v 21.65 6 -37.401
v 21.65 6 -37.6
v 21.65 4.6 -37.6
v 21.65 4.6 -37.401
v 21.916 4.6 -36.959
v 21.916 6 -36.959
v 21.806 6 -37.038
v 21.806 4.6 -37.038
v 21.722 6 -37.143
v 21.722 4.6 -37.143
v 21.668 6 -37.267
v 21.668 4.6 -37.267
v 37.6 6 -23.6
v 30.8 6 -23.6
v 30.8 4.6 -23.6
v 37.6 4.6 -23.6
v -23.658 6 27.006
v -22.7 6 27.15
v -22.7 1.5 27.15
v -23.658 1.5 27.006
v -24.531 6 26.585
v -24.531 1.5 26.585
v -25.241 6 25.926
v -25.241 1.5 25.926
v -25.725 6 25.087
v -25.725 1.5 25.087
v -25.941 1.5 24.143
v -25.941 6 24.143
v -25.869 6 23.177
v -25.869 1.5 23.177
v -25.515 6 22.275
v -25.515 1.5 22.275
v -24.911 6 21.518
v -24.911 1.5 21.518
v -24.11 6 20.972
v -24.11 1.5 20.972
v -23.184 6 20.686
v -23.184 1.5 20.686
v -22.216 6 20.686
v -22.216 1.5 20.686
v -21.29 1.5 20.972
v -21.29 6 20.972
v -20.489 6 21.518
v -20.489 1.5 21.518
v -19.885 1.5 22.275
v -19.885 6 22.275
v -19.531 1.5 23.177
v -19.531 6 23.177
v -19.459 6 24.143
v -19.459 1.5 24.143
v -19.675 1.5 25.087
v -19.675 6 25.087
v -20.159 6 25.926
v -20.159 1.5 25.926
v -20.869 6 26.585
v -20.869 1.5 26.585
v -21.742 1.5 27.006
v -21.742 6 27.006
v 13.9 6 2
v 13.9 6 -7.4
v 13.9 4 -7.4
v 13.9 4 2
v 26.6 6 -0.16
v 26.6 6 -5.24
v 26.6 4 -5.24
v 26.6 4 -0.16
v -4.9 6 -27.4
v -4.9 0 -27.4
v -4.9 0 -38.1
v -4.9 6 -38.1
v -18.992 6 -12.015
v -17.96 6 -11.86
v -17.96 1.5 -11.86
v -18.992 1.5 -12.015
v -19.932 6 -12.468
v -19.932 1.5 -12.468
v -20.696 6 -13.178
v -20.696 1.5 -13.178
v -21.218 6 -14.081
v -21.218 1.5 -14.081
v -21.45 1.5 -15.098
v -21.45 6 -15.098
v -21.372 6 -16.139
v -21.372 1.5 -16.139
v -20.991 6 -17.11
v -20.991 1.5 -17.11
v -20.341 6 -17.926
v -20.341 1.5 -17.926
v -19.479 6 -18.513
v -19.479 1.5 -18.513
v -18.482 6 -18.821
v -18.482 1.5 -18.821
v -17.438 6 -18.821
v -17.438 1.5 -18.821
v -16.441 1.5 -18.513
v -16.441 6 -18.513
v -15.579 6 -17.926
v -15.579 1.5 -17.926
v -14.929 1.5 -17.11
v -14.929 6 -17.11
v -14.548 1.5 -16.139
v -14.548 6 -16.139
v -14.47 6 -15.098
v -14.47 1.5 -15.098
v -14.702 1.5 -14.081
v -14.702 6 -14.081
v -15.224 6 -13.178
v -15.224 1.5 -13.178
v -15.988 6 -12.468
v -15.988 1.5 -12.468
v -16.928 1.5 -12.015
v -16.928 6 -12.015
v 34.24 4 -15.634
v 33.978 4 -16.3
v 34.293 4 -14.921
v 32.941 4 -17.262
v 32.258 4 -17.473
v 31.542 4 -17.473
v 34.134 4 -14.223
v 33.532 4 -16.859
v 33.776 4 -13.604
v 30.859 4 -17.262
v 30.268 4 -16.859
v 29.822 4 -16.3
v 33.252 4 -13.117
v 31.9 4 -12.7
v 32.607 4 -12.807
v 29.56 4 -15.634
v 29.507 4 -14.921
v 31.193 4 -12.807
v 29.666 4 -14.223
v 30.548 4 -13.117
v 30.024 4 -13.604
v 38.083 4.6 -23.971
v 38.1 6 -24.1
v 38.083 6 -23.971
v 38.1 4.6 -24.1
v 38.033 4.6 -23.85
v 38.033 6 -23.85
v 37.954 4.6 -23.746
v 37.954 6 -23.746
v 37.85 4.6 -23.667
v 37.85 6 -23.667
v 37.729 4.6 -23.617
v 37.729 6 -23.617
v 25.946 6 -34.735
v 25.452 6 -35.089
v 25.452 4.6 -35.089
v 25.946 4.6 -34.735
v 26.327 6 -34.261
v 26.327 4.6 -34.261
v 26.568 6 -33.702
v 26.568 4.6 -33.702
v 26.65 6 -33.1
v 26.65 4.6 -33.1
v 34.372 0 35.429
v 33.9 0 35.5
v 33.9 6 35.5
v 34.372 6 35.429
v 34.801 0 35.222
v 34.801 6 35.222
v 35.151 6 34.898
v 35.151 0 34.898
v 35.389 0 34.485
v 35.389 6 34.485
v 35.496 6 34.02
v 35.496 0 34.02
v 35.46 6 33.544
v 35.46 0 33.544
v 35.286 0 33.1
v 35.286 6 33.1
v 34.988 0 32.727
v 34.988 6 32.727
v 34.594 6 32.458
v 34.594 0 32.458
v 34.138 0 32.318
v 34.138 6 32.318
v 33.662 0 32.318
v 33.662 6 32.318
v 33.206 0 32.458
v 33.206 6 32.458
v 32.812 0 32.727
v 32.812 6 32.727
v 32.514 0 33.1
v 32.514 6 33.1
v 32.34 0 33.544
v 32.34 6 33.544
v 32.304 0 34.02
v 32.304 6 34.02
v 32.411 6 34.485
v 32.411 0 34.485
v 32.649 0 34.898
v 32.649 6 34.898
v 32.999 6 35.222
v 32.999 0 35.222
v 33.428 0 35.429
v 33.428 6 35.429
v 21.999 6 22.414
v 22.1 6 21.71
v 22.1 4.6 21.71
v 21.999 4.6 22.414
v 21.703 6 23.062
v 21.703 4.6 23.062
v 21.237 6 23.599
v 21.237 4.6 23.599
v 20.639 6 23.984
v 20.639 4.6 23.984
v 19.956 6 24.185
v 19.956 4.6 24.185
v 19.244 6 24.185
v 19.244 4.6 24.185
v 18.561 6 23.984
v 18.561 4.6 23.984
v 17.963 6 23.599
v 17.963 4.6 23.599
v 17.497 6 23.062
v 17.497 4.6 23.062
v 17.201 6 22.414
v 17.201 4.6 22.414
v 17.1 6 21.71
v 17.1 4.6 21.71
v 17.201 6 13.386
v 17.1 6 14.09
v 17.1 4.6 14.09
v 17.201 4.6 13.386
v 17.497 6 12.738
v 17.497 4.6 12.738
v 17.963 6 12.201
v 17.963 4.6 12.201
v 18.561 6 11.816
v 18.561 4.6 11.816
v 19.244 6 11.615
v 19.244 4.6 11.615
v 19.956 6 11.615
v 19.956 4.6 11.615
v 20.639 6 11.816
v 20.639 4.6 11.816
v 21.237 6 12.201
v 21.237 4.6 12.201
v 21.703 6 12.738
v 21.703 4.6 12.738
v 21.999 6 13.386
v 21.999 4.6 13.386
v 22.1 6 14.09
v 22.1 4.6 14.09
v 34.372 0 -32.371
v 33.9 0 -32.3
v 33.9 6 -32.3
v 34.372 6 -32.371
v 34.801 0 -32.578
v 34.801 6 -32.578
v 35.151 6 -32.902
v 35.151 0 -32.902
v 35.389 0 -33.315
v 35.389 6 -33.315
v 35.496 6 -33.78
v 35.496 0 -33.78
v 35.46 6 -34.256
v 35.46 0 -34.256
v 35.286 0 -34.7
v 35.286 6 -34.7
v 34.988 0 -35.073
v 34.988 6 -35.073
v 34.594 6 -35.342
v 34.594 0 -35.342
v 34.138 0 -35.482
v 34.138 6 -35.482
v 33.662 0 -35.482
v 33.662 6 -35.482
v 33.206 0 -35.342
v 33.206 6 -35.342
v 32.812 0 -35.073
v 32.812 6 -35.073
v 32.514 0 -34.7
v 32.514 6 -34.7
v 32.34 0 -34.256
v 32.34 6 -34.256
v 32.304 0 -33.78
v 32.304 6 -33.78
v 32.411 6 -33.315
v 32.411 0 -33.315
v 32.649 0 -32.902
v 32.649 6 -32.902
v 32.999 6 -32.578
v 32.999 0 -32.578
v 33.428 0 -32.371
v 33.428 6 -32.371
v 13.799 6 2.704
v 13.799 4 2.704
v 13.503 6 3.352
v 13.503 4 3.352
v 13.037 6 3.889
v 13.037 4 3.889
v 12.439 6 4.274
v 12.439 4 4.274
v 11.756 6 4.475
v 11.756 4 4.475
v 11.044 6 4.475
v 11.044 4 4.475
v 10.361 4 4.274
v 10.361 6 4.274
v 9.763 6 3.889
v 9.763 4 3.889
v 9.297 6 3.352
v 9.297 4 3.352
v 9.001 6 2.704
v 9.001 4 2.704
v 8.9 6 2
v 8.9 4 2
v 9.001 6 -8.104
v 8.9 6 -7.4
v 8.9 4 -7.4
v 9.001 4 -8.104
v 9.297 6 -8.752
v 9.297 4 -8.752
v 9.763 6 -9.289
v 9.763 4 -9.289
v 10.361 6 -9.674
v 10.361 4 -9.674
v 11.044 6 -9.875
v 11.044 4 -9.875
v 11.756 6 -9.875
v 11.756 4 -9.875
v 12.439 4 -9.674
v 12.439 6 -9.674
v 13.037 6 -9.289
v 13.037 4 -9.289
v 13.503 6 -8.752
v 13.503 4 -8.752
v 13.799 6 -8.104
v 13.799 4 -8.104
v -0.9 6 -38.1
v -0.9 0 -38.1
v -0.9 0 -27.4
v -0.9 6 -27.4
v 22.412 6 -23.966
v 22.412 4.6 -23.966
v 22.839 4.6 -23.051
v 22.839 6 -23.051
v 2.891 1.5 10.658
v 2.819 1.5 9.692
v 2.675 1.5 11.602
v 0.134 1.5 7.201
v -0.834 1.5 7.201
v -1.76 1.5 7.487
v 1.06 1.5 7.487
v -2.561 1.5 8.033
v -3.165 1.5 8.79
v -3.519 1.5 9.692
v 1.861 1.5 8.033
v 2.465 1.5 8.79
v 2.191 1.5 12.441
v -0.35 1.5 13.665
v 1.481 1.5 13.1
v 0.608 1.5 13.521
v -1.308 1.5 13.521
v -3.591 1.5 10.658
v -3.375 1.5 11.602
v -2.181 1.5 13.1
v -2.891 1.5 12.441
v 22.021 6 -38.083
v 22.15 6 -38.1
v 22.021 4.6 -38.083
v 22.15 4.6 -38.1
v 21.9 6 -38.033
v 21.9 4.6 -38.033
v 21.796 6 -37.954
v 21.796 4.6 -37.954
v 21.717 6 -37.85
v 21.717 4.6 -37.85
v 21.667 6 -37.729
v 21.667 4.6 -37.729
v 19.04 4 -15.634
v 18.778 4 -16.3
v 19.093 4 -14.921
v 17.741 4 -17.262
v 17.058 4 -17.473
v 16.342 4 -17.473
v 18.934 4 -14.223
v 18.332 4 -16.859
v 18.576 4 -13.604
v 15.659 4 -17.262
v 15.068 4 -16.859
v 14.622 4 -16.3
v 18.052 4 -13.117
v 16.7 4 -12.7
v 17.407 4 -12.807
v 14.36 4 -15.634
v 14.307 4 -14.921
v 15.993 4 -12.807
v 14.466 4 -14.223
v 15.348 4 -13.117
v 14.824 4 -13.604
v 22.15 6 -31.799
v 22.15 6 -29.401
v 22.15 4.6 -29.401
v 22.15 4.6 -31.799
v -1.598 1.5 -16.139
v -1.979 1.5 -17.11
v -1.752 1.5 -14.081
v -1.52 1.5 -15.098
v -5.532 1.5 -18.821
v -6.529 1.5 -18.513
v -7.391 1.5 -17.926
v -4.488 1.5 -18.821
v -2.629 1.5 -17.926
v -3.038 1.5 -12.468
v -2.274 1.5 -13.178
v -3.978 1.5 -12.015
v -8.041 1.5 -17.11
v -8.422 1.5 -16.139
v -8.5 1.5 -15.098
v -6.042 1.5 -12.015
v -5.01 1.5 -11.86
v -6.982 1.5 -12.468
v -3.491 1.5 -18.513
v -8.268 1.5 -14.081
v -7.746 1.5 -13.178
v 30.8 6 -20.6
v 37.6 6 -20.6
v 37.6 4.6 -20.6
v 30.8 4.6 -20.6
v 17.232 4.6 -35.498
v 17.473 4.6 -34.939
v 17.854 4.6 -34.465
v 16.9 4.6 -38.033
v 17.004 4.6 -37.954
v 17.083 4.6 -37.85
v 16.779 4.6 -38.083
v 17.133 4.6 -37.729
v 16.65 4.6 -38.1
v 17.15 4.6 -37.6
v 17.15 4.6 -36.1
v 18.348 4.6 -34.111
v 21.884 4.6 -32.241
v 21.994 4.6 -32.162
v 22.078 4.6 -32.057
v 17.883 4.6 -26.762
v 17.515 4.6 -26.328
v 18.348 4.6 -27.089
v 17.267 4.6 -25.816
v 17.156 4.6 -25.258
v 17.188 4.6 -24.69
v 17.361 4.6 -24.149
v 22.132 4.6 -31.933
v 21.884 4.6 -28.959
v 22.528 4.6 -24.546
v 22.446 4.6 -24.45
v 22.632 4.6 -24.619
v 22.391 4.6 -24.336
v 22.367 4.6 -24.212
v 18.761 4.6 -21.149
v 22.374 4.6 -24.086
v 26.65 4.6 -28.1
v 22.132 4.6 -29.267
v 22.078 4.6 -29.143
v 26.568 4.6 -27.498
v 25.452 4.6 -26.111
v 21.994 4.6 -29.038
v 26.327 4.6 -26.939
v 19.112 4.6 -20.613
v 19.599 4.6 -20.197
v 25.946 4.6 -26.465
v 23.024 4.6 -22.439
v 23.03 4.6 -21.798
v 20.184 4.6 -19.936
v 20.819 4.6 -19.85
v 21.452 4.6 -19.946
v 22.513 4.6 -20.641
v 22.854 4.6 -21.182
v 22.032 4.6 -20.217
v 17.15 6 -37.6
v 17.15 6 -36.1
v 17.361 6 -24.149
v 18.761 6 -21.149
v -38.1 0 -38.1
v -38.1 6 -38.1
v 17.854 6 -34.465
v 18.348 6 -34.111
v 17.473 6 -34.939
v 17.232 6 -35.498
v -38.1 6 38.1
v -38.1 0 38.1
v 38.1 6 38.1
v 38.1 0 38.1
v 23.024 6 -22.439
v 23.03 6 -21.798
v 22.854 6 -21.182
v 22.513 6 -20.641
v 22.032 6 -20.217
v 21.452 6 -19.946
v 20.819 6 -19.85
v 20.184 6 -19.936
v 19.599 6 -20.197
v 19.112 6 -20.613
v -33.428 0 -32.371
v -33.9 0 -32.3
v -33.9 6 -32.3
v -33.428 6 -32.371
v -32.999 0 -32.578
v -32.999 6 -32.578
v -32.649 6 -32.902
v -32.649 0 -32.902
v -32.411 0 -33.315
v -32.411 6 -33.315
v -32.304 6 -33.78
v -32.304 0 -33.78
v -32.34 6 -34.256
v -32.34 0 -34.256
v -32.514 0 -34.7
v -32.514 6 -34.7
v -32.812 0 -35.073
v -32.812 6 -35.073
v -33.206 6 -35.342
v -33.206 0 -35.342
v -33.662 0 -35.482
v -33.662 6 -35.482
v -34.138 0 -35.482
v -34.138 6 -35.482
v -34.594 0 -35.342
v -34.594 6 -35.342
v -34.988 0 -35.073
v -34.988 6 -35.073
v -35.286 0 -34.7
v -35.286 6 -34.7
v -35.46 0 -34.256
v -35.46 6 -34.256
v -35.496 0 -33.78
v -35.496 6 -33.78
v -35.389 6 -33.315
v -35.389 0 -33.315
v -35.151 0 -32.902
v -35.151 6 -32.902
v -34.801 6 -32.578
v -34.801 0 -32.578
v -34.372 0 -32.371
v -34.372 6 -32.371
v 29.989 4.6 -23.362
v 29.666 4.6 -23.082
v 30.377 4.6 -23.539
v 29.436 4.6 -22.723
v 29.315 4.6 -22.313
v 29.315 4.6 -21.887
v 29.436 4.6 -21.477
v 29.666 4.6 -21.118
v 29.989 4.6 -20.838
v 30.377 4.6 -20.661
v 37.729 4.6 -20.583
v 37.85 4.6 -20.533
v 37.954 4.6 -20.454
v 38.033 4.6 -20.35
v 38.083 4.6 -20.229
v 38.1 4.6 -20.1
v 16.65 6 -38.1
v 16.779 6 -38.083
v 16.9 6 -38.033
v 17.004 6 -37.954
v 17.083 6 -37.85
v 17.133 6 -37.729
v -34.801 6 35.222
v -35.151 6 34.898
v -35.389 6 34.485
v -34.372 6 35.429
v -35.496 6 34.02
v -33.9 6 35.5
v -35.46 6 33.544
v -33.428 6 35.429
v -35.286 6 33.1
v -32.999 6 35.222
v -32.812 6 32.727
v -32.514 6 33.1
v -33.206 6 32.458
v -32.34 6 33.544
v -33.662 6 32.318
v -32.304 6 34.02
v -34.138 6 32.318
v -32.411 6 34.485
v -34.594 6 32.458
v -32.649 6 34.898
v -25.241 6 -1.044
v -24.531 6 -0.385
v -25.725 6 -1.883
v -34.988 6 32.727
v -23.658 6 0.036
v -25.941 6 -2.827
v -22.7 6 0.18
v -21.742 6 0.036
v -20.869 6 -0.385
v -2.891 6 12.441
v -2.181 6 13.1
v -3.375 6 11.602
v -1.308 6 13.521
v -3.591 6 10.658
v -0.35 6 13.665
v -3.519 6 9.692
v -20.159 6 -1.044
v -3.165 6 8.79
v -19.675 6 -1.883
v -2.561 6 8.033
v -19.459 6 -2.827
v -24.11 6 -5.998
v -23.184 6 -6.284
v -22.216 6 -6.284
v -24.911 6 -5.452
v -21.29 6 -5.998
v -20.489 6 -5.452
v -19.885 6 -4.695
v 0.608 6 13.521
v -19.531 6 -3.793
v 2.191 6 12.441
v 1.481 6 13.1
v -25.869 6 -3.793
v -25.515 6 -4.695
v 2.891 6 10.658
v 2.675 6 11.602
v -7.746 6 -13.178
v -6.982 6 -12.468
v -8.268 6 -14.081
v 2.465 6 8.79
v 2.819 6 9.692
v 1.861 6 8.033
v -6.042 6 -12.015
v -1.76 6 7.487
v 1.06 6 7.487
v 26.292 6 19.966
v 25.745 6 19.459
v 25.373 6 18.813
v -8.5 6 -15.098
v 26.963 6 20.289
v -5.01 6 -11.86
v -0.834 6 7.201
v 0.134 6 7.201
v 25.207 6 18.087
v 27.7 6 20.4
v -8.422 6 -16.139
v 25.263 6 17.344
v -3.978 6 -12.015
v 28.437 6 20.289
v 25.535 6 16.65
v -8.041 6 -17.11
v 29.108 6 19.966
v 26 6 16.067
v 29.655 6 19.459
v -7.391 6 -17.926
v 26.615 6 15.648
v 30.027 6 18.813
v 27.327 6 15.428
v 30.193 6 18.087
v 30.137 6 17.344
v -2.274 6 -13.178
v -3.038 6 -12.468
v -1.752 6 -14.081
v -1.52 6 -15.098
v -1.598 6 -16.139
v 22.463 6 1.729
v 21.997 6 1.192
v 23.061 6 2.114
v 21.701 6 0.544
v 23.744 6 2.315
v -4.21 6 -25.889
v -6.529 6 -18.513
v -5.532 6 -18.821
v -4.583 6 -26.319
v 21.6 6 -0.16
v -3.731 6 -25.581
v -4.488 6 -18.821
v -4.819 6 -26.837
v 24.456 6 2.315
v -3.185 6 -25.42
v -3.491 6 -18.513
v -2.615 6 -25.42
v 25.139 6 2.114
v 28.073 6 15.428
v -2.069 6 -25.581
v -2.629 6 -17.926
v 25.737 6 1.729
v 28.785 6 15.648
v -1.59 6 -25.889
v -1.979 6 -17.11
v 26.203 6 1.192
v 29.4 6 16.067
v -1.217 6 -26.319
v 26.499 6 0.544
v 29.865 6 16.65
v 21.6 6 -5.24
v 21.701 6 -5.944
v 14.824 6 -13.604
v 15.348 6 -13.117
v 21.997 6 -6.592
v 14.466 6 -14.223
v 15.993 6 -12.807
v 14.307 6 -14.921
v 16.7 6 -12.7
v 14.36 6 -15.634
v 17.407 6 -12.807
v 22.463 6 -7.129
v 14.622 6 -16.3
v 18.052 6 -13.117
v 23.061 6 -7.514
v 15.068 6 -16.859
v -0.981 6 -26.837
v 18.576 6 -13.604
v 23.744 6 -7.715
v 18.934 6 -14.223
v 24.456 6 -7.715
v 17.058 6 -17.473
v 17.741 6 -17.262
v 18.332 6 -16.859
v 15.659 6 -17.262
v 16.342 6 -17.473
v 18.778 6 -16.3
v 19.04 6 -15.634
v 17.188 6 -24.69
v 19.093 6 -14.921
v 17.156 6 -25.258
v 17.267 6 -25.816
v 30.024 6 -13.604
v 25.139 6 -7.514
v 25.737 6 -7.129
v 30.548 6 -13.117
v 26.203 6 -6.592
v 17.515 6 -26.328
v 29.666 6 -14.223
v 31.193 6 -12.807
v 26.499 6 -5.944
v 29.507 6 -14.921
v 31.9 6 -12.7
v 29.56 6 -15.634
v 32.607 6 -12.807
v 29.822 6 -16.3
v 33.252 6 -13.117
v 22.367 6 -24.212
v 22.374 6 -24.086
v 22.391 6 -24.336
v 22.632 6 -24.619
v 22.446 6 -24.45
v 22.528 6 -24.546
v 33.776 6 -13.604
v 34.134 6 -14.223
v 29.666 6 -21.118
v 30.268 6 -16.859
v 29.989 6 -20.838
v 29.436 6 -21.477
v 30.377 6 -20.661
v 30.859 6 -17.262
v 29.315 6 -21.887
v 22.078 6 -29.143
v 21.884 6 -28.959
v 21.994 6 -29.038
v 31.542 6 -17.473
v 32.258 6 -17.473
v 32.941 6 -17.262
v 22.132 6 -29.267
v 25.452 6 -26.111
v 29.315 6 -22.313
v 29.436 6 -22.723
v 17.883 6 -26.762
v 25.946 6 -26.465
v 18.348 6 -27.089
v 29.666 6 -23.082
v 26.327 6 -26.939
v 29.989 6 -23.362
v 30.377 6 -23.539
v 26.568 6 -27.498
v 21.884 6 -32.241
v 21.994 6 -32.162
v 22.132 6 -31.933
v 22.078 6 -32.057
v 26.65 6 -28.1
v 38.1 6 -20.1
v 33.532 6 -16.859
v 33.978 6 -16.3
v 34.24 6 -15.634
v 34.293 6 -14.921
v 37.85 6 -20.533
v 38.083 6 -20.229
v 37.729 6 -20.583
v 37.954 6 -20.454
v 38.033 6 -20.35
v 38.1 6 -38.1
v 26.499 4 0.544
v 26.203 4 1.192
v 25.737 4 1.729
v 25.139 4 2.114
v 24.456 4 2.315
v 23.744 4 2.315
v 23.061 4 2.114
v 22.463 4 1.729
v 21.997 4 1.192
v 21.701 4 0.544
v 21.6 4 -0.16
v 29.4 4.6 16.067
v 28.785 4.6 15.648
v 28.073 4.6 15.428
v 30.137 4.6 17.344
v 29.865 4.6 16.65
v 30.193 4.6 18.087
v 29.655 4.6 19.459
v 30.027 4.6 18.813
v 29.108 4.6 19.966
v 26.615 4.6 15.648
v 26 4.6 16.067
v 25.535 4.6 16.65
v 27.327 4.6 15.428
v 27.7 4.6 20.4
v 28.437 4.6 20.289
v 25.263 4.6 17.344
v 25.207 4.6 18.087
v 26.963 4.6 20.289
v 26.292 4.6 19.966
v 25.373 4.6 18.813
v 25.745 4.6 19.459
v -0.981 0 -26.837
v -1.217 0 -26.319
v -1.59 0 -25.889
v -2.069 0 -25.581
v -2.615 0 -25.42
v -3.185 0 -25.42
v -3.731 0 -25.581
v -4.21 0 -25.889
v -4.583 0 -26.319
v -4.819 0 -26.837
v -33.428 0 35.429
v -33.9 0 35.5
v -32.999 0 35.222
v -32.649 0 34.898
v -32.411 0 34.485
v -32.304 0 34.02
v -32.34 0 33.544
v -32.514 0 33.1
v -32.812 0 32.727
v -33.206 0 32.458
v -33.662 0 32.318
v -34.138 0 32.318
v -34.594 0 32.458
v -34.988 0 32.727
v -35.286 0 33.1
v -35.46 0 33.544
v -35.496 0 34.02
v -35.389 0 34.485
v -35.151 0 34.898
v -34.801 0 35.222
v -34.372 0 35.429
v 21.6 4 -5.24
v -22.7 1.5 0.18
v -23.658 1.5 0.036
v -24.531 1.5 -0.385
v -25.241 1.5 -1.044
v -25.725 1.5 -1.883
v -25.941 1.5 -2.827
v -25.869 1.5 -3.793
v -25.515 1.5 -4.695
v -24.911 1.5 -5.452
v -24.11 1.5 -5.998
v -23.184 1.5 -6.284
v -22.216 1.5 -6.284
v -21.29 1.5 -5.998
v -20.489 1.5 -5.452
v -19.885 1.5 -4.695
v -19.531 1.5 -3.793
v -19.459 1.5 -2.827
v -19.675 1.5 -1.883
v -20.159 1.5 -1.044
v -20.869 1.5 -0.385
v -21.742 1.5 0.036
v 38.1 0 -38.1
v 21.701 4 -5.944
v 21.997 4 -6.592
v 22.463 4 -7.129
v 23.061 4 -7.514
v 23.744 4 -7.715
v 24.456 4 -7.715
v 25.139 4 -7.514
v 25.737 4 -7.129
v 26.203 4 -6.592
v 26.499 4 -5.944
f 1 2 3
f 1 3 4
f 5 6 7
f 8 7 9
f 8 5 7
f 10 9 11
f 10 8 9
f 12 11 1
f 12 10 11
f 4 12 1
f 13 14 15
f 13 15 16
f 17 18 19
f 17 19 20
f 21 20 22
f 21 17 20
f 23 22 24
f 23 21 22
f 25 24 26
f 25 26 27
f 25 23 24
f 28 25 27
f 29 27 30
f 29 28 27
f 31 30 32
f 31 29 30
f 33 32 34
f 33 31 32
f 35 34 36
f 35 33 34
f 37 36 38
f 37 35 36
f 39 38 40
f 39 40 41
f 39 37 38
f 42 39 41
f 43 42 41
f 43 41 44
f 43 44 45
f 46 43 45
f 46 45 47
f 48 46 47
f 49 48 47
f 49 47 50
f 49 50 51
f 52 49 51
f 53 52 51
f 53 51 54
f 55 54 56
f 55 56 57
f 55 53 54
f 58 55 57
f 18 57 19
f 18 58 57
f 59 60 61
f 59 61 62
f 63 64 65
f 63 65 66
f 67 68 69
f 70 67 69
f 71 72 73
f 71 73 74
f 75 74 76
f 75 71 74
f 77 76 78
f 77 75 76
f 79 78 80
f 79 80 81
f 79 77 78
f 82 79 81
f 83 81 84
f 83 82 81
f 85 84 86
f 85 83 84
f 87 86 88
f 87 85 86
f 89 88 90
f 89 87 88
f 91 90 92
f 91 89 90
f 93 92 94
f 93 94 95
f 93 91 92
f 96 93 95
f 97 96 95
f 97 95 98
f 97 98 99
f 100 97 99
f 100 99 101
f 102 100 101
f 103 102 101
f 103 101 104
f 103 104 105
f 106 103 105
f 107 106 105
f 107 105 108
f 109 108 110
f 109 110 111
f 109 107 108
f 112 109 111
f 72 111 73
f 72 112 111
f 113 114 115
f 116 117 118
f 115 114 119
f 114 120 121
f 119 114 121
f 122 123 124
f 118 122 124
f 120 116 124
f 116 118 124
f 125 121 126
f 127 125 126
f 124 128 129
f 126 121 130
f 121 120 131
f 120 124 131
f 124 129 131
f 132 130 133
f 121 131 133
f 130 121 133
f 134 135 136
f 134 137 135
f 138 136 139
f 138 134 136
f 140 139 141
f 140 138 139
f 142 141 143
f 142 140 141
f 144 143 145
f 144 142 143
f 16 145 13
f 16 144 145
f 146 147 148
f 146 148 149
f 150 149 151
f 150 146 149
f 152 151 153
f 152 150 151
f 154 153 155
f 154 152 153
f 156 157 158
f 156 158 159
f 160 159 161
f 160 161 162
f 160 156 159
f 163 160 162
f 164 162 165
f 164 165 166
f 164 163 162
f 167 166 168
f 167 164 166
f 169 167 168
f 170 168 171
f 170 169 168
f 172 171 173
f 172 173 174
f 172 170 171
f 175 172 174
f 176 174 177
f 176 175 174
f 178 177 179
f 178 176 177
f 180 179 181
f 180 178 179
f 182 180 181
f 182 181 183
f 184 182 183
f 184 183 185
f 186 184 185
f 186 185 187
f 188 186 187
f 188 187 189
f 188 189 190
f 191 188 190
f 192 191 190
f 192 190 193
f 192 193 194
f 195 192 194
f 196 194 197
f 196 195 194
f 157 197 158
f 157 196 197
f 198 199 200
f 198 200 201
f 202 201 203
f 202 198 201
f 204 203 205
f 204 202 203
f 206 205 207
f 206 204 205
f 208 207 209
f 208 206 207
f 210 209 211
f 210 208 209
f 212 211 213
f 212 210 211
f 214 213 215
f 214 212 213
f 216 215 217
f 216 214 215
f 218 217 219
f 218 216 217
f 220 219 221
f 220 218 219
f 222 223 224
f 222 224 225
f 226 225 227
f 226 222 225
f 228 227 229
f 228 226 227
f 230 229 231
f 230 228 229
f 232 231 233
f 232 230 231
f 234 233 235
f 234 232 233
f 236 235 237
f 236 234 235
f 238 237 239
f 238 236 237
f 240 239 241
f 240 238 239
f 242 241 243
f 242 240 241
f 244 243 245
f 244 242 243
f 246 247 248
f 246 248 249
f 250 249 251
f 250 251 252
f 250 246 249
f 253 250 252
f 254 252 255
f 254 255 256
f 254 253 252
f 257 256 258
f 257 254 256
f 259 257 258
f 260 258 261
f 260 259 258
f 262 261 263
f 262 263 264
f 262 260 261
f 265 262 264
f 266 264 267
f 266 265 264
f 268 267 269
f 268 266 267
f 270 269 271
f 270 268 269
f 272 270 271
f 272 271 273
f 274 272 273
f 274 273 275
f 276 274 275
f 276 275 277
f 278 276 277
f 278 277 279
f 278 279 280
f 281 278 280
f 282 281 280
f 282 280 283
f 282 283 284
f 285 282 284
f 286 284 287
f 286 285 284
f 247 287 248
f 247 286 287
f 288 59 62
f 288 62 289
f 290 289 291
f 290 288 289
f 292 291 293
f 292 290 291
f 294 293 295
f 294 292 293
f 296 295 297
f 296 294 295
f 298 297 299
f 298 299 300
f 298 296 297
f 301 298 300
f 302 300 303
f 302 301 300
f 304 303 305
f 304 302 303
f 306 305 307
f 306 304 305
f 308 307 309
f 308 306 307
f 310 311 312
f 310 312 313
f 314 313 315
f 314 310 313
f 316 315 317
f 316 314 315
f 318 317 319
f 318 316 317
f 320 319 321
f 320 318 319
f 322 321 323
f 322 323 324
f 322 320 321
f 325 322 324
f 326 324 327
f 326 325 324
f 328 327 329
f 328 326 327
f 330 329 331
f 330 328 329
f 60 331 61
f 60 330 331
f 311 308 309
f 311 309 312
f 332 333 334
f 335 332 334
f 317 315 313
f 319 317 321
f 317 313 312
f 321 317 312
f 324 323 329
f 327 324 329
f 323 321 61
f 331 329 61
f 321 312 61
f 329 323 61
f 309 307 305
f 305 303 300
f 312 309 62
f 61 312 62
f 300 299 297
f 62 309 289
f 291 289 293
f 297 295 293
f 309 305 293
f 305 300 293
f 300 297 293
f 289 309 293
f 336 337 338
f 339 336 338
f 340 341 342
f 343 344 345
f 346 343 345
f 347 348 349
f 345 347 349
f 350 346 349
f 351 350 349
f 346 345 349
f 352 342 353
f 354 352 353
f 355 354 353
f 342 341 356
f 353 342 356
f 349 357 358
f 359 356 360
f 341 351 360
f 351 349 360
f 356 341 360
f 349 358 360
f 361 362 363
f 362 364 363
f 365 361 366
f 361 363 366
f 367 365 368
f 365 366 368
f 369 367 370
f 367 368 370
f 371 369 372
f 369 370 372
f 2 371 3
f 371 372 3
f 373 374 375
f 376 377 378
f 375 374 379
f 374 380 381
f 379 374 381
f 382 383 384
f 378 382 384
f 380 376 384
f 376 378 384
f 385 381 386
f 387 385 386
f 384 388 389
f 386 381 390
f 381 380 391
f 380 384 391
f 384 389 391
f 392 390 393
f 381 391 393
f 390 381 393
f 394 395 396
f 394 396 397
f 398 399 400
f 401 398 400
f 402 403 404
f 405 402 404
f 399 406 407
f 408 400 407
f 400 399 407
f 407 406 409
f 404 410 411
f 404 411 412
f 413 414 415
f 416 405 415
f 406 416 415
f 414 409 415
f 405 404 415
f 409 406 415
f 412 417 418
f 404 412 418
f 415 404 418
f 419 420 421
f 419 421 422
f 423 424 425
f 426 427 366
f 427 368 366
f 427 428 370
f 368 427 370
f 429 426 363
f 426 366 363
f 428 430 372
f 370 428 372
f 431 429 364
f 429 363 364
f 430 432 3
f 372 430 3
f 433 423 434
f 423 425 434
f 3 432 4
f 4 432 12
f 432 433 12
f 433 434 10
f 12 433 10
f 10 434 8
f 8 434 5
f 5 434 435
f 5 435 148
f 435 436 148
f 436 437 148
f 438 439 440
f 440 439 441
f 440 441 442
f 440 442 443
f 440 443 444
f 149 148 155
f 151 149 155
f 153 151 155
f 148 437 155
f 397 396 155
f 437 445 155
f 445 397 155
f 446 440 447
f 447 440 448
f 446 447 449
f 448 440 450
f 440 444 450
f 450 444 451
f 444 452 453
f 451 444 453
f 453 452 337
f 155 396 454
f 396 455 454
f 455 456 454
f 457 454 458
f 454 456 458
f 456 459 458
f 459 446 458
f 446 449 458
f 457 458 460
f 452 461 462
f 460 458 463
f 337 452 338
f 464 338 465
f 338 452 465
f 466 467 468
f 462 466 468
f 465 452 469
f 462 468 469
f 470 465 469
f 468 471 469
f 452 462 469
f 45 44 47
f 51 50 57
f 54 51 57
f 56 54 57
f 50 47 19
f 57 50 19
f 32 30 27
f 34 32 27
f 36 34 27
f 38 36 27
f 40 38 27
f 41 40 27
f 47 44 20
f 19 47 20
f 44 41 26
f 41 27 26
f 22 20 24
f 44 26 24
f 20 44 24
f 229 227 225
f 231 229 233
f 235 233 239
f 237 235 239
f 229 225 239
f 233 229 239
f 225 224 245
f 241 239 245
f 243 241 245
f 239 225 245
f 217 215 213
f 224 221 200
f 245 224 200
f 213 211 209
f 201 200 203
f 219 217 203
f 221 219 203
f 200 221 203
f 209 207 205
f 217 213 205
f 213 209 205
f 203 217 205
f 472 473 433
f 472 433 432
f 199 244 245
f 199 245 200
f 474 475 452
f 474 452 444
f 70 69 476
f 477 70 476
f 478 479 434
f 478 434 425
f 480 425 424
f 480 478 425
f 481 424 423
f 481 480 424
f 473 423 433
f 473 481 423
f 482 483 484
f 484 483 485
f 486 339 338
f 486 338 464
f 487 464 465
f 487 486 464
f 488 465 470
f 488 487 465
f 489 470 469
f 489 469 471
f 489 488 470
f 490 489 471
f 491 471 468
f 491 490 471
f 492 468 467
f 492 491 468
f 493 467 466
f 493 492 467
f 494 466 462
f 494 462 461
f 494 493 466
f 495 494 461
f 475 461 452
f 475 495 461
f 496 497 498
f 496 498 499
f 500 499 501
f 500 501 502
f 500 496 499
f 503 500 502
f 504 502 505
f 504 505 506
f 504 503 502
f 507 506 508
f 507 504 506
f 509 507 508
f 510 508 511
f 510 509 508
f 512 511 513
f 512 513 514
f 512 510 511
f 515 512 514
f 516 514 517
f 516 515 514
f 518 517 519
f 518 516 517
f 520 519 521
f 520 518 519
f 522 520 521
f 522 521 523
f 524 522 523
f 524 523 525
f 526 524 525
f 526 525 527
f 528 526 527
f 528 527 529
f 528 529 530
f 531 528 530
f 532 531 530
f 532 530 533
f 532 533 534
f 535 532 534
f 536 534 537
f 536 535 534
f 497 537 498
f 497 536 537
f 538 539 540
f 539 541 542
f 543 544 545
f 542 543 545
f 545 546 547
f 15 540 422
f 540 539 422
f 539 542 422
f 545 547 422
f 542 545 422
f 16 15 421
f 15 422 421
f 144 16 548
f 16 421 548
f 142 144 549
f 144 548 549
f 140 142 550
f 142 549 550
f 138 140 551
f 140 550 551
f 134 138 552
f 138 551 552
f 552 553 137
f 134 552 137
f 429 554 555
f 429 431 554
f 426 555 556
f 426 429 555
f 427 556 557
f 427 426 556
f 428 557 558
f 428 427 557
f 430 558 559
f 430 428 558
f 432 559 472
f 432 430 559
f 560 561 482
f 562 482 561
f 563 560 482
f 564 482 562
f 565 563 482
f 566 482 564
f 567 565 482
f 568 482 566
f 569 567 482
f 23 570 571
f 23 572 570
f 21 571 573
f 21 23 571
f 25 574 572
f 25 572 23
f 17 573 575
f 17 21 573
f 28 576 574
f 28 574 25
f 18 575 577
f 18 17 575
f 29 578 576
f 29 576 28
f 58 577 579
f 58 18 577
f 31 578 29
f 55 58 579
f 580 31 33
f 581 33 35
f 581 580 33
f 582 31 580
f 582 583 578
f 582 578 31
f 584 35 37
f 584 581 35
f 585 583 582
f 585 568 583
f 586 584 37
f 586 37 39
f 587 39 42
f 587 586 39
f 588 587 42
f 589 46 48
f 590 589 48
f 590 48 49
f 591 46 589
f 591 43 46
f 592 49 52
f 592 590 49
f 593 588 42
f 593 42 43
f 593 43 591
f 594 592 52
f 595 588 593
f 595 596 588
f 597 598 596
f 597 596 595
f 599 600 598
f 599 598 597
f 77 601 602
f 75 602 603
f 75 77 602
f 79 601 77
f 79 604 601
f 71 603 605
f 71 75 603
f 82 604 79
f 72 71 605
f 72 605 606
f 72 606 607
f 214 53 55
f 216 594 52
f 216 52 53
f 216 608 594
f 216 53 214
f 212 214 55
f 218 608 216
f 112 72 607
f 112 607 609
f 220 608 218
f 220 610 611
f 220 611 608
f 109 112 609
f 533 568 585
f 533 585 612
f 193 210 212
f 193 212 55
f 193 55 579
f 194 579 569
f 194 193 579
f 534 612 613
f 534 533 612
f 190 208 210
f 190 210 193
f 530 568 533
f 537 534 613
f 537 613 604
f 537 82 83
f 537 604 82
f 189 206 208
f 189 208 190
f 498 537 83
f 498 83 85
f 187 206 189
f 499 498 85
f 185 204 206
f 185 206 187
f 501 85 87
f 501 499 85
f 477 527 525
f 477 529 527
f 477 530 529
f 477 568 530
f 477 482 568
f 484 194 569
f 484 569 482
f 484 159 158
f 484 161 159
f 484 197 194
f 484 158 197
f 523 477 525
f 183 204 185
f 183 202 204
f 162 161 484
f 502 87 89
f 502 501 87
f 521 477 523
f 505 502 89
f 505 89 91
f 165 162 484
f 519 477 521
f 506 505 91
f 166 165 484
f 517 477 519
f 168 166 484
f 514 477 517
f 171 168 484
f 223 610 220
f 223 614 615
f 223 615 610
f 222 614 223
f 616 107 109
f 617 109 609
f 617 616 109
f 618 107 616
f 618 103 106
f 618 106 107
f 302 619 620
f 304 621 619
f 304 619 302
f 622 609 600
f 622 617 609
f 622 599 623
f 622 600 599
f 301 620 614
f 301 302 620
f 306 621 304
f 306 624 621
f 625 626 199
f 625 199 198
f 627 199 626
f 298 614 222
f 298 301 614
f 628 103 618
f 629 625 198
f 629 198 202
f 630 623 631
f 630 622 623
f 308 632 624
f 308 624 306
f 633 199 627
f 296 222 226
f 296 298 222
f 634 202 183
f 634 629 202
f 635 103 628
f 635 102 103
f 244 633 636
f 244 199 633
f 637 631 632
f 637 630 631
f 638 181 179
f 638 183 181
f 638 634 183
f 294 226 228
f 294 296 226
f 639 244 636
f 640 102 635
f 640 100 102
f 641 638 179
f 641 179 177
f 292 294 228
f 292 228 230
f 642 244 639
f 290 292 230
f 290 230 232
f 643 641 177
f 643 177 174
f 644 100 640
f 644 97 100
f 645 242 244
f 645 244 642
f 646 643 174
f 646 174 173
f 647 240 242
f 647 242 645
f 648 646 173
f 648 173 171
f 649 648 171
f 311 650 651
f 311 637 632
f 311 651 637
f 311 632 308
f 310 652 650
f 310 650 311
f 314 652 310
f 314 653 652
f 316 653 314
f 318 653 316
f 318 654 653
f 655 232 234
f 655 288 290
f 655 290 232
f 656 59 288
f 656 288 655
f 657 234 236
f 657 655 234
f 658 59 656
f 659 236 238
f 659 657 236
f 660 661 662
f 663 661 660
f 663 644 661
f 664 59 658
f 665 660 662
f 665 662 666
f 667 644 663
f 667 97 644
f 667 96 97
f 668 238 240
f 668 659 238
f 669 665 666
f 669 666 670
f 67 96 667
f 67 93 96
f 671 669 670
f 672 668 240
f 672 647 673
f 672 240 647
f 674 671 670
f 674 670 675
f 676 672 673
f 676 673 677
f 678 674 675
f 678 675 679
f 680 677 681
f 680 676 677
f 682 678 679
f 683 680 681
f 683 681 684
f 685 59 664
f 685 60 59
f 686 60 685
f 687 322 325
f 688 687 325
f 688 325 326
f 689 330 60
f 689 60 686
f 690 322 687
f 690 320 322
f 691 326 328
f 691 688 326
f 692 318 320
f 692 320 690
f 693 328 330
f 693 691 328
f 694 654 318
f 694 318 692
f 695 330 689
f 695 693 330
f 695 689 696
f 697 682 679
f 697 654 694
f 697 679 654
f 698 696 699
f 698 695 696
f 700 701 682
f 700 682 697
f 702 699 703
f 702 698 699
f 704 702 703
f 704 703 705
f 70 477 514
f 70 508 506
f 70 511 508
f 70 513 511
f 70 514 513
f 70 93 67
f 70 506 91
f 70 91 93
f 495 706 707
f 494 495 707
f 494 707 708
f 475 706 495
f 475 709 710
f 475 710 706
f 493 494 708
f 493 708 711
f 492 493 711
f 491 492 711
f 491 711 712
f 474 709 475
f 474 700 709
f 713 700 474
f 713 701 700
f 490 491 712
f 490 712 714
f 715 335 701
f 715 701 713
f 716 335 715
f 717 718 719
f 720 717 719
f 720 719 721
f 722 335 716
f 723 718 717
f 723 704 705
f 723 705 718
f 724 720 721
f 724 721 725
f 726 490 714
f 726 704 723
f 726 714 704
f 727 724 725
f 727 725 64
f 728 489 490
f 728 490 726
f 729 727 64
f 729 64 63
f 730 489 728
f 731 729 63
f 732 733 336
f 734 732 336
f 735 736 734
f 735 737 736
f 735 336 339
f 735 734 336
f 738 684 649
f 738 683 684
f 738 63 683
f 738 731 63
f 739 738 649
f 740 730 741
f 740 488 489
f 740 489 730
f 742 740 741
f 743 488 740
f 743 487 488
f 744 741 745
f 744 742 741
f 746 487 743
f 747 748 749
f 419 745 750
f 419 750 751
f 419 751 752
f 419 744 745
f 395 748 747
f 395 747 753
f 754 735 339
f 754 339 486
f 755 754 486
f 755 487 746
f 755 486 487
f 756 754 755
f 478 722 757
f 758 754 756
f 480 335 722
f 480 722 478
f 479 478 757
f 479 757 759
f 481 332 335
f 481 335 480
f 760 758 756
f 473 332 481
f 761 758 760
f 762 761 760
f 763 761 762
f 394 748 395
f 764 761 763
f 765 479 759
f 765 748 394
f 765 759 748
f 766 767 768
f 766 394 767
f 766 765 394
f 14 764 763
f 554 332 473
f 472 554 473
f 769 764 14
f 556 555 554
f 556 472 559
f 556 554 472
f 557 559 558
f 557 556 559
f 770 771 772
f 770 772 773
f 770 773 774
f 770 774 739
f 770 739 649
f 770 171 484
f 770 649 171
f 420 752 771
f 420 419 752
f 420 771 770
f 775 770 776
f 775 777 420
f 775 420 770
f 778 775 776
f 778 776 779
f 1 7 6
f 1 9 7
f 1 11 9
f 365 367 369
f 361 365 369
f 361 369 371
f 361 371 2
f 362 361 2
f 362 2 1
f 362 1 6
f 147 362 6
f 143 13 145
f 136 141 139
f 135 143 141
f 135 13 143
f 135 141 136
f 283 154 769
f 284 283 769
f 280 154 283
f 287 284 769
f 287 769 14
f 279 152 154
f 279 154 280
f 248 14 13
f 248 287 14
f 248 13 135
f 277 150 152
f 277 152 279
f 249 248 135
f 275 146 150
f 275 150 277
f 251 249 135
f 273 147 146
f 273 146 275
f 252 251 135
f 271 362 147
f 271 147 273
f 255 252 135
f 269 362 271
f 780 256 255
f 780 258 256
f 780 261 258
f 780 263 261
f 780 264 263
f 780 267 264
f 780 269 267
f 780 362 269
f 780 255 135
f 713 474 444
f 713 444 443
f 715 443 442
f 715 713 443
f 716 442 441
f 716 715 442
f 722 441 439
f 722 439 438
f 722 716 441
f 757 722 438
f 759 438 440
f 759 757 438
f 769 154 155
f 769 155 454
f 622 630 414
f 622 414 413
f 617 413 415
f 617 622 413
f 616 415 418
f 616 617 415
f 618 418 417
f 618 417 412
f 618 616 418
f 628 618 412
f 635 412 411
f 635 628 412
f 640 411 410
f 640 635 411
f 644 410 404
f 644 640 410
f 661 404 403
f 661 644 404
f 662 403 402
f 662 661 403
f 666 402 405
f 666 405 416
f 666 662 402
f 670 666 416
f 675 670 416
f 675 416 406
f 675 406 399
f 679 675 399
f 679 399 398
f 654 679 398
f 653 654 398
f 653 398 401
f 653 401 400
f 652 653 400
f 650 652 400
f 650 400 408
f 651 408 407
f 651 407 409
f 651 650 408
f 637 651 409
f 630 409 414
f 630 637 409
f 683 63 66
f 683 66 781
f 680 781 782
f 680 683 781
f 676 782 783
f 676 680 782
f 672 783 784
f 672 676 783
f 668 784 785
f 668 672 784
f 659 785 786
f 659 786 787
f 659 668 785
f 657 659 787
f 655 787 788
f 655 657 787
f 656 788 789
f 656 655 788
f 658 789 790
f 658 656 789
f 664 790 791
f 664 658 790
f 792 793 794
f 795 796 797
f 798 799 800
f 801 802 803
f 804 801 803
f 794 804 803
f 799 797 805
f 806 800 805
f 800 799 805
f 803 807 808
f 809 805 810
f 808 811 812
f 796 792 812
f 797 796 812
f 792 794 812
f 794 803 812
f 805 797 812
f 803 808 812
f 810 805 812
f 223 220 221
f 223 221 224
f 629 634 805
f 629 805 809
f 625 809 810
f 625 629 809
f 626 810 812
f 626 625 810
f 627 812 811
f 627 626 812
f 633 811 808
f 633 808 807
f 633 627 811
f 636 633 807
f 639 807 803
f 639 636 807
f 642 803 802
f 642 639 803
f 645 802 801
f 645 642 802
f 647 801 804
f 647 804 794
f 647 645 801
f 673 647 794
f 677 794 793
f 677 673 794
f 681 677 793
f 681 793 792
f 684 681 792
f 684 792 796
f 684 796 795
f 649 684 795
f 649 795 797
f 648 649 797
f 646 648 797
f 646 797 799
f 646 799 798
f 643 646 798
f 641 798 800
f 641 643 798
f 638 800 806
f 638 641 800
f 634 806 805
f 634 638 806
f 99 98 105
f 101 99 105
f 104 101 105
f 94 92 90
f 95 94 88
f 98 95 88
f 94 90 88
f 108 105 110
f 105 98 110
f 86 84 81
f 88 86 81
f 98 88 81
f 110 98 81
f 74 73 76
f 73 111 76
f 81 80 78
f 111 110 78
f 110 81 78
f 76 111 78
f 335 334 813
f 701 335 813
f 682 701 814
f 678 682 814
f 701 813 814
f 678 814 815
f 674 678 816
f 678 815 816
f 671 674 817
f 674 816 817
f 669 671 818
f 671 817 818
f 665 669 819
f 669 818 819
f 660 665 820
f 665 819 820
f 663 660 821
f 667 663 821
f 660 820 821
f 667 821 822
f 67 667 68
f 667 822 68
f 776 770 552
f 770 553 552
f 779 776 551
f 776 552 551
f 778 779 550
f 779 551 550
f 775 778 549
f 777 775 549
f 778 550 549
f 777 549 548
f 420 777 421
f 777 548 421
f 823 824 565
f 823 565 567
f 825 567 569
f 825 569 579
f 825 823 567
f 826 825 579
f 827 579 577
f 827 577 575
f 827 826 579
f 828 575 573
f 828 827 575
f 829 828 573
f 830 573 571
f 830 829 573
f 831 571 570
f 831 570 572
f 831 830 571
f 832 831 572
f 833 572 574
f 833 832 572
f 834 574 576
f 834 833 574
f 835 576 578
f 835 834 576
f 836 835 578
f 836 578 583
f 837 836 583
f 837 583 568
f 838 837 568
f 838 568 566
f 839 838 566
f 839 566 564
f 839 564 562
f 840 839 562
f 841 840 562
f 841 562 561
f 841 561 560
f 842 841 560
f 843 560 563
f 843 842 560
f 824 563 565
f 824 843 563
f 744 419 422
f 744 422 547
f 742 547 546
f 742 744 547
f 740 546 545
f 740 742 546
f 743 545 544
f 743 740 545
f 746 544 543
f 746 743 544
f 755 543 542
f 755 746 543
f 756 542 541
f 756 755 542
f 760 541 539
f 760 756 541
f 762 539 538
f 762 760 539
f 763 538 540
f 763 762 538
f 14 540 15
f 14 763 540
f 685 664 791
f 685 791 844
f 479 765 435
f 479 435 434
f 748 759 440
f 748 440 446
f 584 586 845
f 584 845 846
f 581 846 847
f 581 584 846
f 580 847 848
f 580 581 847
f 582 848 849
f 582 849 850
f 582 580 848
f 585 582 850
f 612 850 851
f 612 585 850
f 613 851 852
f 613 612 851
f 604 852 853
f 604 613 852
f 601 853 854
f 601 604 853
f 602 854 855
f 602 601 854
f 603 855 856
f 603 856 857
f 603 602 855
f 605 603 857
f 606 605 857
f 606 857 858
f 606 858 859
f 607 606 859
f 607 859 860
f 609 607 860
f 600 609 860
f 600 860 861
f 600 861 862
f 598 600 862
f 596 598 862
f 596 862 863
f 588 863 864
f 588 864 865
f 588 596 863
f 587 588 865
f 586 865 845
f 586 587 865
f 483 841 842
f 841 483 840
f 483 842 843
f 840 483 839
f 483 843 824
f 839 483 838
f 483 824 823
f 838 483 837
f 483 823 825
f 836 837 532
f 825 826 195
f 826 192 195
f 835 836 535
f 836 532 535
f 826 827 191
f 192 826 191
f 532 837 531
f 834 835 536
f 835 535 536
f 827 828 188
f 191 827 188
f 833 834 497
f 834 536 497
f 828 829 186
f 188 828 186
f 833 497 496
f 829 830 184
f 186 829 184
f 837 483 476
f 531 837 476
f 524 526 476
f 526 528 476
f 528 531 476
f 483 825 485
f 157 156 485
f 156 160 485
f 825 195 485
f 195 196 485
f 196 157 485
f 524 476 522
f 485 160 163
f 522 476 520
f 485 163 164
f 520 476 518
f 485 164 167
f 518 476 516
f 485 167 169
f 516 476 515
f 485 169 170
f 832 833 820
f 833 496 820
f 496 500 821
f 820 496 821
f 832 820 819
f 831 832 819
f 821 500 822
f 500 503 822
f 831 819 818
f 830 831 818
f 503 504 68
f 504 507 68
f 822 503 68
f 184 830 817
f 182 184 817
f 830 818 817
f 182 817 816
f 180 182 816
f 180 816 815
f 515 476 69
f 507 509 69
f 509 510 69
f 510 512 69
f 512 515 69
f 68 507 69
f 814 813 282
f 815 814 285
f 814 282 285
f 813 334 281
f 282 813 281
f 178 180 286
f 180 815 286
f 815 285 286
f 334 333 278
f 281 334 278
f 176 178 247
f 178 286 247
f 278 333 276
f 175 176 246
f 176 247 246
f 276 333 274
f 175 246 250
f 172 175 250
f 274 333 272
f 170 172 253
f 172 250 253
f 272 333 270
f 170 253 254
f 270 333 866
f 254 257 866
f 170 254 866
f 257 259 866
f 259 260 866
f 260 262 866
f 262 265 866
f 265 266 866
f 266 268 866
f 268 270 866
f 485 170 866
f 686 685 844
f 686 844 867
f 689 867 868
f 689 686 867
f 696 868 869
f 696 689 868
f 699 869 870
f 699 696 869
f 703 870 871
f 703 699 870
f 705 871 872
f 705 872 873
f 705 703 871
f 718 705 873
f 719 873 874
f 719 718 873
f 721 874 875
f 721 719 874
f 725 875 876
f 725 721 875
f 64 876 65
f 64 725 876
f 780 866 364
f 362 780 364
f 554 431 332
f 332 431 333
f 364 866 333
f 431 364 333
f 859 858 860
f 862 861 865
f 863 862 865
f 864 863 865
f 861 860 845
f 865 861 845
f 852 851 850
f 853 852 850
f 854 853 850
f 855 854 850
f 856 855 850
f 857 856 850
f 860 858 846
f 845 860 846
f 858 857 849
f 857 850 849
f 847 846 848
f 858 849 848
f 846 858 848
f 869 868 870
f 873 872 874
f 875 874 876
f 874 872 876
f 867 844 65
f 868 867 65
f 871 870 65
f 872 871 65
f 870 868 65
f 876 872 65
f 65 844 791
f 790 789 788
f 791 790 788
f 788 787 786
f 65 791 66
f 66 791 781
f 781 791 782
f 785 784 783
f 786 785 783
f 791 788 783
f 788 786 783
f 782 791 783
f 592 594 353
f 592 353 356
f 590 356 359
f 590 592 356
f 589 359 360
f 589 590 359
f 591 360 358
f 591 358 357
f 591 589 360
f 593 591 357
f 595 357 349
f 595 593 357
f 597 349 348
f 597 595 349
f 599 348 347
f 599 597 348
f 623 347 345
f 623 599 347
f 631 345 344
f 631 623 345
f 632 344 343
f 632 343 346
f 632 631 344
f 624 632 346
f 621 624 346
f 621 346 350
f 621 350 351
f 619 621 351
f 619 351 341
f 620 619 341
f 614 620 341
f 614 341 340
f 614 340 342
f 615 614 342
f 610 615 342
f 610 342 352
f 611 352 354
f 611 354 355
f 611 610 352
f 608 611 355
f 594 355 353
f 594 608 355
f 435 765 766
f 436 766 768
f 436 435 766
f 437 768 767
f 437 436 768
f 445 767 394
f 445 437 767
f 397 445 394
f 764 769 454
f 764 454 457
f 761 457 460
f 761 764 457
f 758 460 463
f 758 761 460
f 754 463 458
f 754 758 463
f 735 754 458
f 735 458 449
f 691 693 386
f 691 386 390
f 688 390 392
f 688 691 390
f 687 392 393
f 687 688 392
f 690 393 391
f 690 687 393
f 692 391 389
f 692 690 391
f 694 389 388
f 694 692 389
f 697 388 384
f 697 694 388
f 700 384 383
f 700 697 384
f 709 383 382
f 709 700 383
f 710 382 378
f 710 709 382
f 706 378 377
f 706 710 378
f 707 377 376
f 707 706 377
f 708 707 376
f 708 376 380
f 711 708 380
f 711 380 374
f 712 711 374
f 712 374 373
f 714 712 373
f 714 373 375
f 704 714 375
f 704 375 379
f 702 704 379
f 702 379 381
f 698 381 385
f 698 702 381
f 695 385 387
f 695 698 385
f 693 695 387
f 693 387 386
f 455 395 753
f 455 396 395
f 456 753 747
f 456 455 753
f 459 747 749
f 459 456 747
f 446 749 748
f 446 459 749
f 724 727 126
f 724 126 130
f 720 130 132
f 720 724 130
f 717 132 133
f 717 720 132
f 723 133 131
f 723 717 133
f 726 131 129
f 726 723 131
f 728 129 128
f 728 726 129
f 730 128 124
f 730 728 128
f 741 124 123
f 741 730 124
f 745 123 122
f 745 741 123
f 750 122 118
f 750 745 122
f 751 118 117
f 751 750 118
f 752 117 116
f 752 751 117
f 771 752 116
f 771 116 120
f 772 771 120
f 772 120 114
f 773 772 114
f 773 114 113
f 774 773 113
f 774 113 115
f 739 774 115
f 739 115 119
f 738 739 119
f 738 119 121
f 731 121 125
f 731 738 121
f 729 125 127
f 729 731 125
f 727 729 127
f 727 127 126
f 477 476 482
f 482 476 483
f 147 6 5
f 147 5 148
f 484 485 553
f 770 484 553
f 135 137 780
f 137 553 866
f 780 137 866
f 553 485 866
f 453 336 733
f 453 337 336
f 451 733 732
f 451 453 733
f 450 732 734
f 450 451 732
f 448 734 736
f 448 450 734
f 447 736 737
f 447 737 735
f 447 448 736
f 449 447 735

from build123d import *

# Parameters (mm, degrees)
BASE_PLATE_R        = 1.6
EXTRUDE_1_DEPTH     = 6
CUT_EXTRUDE_START   = -6
SKETCH_1_R          = 3.25
SKETCH_1_R_2        = 3.5
CUT_EXTRUDE_1_DEPTH = 4.5
SKETCH_1_6_R        = 2.4
CUT_EXTRUDE_2_DEPTH = 2
SKETCH_1_7_R        = 2.5
CUT_EXTRUDE_3_DEPTH = 1.4
FILLET_2_R          = 0.5


with BuildPart() as part:
    # Base plate → 凸台-拉伸1 (new body)
    with BuildSketch(Plane(origin=(0, 0, 0), x_dir=(1, 0, 0), z_dir=(0, 1, 0))):
        with BuildLine():
            Line((-38.1, -38.1), (38.1, -38.1))
            Line((38.1, -38.1), (38.1, 38.1))
            Line((38.1, 38.1), (-0.9, 38.1))
            Line((-0.9, 38.1), (-0.9, 27.4))
            ThreePointArc((-0.9, 27.4), (-2.9, 25.4), (-4.9, 27.4))
            Line((-4.9, 27.4), (-4.9, 38.1))
            Line((-4.9, 38.1), (-38.1, 38.1))
            Line((-38.1, 38.1), (-38.1, -38.1))
        make_face()
        with Locations(Location((-33.9, -33.9, 0), (0, 0, 270))):
            Circle(BASE_PLATE_R, mode=Mode.SUBTRACT)
        with Locations(Location((33.9, -33.9, 0), (0, 0, 270))):
            Circle(BASE_PLATE_R, mode=Mode.SUBTRACT)
        with Locations(Location((-33.9, 33.9, 0), (0, 0, 270))):
            Circle(BASE_PLATE_R, mode=Mode.SUBTRACT)
        with Locations(Location((33.9, 33.9, 0), (0, 0, 270))):
            Circle(BASE_PLATE_R, mode=Mode.SUBTRACT)
    extrude(amount=EXTRUDE_1_DEPTH)

    # 草图1 → 切除-拉伸1 (cut)
    with BuildSketch(Plane.XZ.offset(CUT_EXTRUDE_START)):
        with Locations(Location((-0.35, 10.415, 0), (0, 0, 90))):
            Circle(SKETCH_1_R)
        with Locations(Location((-22.7, 23.9, 0), (0, 0, 90))):
            Circle(SKETCH_1_R)
        with Locations(Location((-22.7, -3.07, 0), (0, 0, 90))):
            Circle(SKETCH_1_R)
        with Locations(Location((-17.96, -15.36, 0), (0, 0, 90))):
            Circle(SKETCH_1_R_2)
        with Locations(Location((-5.01, -15.36, 0), (0, 0, 90))):
            Circle(SKETCH_1_R_2)
    extrude(amount=CUT_EXTRUDE_1_DEPTH, mode=Mode.SUBTRACT)

    # 草图1<6> → 切除-拉伸2 (cut)
    with BuildSketch(Plane.XZ.offset(CUT_EXTRUDE_START)):
        with BuildLine():
            Line((8.9, 2), (8.9, -7.4))
            ThreePointArc((8.9, -7.4), (11.4, -9.9), (13.9, -7.4))
            Line((13.9, -7.4), (13.9, 2))
            ThreePointArc((13.9, 2), (11.4, 4.5), (8.9, 2))
        make_face()
        with BuildLine():
            Line((21.6, -0.16), (21.6, -5.24))
            ThreePointArc((21.6, -5.24), (24.1, -7.74), (26.6, -5.24))
            Line((26.6, -5.24), (26.6, -0.16))
            ThreePointArc((26.6, -0.16), (24.1, 2.34), (21.6, -0.16))
        make_face()
        with Locations(Location((31.9, -15.1, 0), (0, 0, 90))):
            Circle(SKETCH_1_6_R)
        with Locations(Location((16.7, -15.1, 0), (0, 0, 90))):
            Circle(SKETCH_1_6_R)
    extrude(amount=CUT_EXTRUDE_2_DEPTH, mode=Mode.SUBTRACT)

    # 草图1<7> → 切除-拉伸3 (cut)
    with BuildSketch(Plane.XZ.offset(CUT_EXTRUDE_START)):
        with BuildLine():
            Line((17.15, -38.1), (21.65, -38.1))
            Line((21.65, -38.1), (21.65, -37.1))
            Line((21.65, -37.1), (21.65, -36.1))
            ThreePointArc((21.65, -36.1), (20.560909108, -34.172620939), (18.347964405, -34.111100529))
            ThreePointArc((18.347964405, -34.111100529), (17.472620939, -34.939090892), (17.15, -36.1))
            Line((17.15, -36.1), (17.15, -38.1))
        make_face()
        with BuildLine():
            Line((21.65, -36.1), (21.65, -37.1))
            Line((21.65, -37.1), (25.452035595, -35.088899471))
            ThreePointArc((25.452035595, -35.088899471), (23.239090892, -35.027379061), (22.15, -33.1))
            Line((22.15, -33.1), (22.15, -32.1))
            Line((22.15, -32.1), (18.347964405, -34.111100529))
            ThreePointArc((18.347964405, -34.111100529), (20.560909108, -34.172620939), (21.65, -36.1))
        make_face()
        with BuildLine():
            ThreePointArc((22.15, -33.1), (24.4, -35.35), (26.65, -33.1))
            Line((26.65, -33.1), (26.65, -28.1))
            ThreePointArc((26.65, -28.1), (24.4, -25.85), (22.15, -28.1))
            Line((22.15, -28.1), (22.15, -33.1))
        make_face()
        with BuildLine():
            Line((18.347964405, -27.088899471), (22.15, -29.1))
            Line((22.15, -29.1), (22.15, -28.1))
            ThreePointArc((22.15, -28.1), (23.239090892, -26.172620939), (25.452035595, -26.111100529))
            Line((25.452035595, -26.111100529), (22.211102988, -24.396797462))
            Line((22.211102988, -24.396797462), (21.438912065, -26.051492297))
            ThreePointArc((21.438912065, -26.051492297), (20.115915291, -27.233064766), (18.347964405, -27.088899471))
        make_face()
        with BuildLine():
            Line((18.761087935, -21.148507703), (17.361087935, -24.148507703))
            ThreePointArc((17.361087935, -24.148507703), (18.448507703, -27.138912065), (21.438912065, -26.051492297))
            Line((21.438912065, -26.051492297), (22.838912065, -23.051492297))
            ThreePointArc((22.838912065, -23.051492297), (21.751492297, -20.061087935), (18.761087935, -21.148507703))
        make_face()
        with BuildLine():
            Line((38.1, -20.6), (30.8, -20.6))
            ThreePointArc((30.8, -20.6), (29.3, -22.1), (30.8, -23.6))
            Line((30.8, -23.6), (38.1, -23.6))
            Line((38.1, -23.6), (38.1, -20.6))
        make_face()
        with BuildLine():
            Line((17.1, 21.71), (17.1, 14.09))
            ThreePointArc((17.1, 14.09), (19.6, 11.59), (22.1, 14.09))
            Line((22.1, 14.09), (22.1, 21.71))
            ThreePointArc((22.1, 21.71), (19.6, 24.21), (17.1, 21.71))
        make_face()
        with Locations(Location((27.7, 17.9, 0), (0, 0, 90))):
            Circle(SKETCH_1_7_R)
    extrude(amount=CUT_EXTRUDE_3_DEPTH, mode=Mode.SUBTRACT)

    # 圆角2
    fillet_2_edges = [part.edges().sort_by_distance(p)[0] for p in [
        (38.1, 5.3, -23.6),
        (38.1, 5.3, -20.6),
        (21.65, 5.3, -38.1),
        (21.65, 5.3, -37.1),
        (22.211102988, 5.3, -24.396797462),
        (22.15, 5.3, -29.1),
        (22.15, 5.3, -32.1),
        (17.15, 5.3, -38.1),
    ]]
    fillet(fillet_2_edges, radius=FILLET_2_R)


solid = part.part
